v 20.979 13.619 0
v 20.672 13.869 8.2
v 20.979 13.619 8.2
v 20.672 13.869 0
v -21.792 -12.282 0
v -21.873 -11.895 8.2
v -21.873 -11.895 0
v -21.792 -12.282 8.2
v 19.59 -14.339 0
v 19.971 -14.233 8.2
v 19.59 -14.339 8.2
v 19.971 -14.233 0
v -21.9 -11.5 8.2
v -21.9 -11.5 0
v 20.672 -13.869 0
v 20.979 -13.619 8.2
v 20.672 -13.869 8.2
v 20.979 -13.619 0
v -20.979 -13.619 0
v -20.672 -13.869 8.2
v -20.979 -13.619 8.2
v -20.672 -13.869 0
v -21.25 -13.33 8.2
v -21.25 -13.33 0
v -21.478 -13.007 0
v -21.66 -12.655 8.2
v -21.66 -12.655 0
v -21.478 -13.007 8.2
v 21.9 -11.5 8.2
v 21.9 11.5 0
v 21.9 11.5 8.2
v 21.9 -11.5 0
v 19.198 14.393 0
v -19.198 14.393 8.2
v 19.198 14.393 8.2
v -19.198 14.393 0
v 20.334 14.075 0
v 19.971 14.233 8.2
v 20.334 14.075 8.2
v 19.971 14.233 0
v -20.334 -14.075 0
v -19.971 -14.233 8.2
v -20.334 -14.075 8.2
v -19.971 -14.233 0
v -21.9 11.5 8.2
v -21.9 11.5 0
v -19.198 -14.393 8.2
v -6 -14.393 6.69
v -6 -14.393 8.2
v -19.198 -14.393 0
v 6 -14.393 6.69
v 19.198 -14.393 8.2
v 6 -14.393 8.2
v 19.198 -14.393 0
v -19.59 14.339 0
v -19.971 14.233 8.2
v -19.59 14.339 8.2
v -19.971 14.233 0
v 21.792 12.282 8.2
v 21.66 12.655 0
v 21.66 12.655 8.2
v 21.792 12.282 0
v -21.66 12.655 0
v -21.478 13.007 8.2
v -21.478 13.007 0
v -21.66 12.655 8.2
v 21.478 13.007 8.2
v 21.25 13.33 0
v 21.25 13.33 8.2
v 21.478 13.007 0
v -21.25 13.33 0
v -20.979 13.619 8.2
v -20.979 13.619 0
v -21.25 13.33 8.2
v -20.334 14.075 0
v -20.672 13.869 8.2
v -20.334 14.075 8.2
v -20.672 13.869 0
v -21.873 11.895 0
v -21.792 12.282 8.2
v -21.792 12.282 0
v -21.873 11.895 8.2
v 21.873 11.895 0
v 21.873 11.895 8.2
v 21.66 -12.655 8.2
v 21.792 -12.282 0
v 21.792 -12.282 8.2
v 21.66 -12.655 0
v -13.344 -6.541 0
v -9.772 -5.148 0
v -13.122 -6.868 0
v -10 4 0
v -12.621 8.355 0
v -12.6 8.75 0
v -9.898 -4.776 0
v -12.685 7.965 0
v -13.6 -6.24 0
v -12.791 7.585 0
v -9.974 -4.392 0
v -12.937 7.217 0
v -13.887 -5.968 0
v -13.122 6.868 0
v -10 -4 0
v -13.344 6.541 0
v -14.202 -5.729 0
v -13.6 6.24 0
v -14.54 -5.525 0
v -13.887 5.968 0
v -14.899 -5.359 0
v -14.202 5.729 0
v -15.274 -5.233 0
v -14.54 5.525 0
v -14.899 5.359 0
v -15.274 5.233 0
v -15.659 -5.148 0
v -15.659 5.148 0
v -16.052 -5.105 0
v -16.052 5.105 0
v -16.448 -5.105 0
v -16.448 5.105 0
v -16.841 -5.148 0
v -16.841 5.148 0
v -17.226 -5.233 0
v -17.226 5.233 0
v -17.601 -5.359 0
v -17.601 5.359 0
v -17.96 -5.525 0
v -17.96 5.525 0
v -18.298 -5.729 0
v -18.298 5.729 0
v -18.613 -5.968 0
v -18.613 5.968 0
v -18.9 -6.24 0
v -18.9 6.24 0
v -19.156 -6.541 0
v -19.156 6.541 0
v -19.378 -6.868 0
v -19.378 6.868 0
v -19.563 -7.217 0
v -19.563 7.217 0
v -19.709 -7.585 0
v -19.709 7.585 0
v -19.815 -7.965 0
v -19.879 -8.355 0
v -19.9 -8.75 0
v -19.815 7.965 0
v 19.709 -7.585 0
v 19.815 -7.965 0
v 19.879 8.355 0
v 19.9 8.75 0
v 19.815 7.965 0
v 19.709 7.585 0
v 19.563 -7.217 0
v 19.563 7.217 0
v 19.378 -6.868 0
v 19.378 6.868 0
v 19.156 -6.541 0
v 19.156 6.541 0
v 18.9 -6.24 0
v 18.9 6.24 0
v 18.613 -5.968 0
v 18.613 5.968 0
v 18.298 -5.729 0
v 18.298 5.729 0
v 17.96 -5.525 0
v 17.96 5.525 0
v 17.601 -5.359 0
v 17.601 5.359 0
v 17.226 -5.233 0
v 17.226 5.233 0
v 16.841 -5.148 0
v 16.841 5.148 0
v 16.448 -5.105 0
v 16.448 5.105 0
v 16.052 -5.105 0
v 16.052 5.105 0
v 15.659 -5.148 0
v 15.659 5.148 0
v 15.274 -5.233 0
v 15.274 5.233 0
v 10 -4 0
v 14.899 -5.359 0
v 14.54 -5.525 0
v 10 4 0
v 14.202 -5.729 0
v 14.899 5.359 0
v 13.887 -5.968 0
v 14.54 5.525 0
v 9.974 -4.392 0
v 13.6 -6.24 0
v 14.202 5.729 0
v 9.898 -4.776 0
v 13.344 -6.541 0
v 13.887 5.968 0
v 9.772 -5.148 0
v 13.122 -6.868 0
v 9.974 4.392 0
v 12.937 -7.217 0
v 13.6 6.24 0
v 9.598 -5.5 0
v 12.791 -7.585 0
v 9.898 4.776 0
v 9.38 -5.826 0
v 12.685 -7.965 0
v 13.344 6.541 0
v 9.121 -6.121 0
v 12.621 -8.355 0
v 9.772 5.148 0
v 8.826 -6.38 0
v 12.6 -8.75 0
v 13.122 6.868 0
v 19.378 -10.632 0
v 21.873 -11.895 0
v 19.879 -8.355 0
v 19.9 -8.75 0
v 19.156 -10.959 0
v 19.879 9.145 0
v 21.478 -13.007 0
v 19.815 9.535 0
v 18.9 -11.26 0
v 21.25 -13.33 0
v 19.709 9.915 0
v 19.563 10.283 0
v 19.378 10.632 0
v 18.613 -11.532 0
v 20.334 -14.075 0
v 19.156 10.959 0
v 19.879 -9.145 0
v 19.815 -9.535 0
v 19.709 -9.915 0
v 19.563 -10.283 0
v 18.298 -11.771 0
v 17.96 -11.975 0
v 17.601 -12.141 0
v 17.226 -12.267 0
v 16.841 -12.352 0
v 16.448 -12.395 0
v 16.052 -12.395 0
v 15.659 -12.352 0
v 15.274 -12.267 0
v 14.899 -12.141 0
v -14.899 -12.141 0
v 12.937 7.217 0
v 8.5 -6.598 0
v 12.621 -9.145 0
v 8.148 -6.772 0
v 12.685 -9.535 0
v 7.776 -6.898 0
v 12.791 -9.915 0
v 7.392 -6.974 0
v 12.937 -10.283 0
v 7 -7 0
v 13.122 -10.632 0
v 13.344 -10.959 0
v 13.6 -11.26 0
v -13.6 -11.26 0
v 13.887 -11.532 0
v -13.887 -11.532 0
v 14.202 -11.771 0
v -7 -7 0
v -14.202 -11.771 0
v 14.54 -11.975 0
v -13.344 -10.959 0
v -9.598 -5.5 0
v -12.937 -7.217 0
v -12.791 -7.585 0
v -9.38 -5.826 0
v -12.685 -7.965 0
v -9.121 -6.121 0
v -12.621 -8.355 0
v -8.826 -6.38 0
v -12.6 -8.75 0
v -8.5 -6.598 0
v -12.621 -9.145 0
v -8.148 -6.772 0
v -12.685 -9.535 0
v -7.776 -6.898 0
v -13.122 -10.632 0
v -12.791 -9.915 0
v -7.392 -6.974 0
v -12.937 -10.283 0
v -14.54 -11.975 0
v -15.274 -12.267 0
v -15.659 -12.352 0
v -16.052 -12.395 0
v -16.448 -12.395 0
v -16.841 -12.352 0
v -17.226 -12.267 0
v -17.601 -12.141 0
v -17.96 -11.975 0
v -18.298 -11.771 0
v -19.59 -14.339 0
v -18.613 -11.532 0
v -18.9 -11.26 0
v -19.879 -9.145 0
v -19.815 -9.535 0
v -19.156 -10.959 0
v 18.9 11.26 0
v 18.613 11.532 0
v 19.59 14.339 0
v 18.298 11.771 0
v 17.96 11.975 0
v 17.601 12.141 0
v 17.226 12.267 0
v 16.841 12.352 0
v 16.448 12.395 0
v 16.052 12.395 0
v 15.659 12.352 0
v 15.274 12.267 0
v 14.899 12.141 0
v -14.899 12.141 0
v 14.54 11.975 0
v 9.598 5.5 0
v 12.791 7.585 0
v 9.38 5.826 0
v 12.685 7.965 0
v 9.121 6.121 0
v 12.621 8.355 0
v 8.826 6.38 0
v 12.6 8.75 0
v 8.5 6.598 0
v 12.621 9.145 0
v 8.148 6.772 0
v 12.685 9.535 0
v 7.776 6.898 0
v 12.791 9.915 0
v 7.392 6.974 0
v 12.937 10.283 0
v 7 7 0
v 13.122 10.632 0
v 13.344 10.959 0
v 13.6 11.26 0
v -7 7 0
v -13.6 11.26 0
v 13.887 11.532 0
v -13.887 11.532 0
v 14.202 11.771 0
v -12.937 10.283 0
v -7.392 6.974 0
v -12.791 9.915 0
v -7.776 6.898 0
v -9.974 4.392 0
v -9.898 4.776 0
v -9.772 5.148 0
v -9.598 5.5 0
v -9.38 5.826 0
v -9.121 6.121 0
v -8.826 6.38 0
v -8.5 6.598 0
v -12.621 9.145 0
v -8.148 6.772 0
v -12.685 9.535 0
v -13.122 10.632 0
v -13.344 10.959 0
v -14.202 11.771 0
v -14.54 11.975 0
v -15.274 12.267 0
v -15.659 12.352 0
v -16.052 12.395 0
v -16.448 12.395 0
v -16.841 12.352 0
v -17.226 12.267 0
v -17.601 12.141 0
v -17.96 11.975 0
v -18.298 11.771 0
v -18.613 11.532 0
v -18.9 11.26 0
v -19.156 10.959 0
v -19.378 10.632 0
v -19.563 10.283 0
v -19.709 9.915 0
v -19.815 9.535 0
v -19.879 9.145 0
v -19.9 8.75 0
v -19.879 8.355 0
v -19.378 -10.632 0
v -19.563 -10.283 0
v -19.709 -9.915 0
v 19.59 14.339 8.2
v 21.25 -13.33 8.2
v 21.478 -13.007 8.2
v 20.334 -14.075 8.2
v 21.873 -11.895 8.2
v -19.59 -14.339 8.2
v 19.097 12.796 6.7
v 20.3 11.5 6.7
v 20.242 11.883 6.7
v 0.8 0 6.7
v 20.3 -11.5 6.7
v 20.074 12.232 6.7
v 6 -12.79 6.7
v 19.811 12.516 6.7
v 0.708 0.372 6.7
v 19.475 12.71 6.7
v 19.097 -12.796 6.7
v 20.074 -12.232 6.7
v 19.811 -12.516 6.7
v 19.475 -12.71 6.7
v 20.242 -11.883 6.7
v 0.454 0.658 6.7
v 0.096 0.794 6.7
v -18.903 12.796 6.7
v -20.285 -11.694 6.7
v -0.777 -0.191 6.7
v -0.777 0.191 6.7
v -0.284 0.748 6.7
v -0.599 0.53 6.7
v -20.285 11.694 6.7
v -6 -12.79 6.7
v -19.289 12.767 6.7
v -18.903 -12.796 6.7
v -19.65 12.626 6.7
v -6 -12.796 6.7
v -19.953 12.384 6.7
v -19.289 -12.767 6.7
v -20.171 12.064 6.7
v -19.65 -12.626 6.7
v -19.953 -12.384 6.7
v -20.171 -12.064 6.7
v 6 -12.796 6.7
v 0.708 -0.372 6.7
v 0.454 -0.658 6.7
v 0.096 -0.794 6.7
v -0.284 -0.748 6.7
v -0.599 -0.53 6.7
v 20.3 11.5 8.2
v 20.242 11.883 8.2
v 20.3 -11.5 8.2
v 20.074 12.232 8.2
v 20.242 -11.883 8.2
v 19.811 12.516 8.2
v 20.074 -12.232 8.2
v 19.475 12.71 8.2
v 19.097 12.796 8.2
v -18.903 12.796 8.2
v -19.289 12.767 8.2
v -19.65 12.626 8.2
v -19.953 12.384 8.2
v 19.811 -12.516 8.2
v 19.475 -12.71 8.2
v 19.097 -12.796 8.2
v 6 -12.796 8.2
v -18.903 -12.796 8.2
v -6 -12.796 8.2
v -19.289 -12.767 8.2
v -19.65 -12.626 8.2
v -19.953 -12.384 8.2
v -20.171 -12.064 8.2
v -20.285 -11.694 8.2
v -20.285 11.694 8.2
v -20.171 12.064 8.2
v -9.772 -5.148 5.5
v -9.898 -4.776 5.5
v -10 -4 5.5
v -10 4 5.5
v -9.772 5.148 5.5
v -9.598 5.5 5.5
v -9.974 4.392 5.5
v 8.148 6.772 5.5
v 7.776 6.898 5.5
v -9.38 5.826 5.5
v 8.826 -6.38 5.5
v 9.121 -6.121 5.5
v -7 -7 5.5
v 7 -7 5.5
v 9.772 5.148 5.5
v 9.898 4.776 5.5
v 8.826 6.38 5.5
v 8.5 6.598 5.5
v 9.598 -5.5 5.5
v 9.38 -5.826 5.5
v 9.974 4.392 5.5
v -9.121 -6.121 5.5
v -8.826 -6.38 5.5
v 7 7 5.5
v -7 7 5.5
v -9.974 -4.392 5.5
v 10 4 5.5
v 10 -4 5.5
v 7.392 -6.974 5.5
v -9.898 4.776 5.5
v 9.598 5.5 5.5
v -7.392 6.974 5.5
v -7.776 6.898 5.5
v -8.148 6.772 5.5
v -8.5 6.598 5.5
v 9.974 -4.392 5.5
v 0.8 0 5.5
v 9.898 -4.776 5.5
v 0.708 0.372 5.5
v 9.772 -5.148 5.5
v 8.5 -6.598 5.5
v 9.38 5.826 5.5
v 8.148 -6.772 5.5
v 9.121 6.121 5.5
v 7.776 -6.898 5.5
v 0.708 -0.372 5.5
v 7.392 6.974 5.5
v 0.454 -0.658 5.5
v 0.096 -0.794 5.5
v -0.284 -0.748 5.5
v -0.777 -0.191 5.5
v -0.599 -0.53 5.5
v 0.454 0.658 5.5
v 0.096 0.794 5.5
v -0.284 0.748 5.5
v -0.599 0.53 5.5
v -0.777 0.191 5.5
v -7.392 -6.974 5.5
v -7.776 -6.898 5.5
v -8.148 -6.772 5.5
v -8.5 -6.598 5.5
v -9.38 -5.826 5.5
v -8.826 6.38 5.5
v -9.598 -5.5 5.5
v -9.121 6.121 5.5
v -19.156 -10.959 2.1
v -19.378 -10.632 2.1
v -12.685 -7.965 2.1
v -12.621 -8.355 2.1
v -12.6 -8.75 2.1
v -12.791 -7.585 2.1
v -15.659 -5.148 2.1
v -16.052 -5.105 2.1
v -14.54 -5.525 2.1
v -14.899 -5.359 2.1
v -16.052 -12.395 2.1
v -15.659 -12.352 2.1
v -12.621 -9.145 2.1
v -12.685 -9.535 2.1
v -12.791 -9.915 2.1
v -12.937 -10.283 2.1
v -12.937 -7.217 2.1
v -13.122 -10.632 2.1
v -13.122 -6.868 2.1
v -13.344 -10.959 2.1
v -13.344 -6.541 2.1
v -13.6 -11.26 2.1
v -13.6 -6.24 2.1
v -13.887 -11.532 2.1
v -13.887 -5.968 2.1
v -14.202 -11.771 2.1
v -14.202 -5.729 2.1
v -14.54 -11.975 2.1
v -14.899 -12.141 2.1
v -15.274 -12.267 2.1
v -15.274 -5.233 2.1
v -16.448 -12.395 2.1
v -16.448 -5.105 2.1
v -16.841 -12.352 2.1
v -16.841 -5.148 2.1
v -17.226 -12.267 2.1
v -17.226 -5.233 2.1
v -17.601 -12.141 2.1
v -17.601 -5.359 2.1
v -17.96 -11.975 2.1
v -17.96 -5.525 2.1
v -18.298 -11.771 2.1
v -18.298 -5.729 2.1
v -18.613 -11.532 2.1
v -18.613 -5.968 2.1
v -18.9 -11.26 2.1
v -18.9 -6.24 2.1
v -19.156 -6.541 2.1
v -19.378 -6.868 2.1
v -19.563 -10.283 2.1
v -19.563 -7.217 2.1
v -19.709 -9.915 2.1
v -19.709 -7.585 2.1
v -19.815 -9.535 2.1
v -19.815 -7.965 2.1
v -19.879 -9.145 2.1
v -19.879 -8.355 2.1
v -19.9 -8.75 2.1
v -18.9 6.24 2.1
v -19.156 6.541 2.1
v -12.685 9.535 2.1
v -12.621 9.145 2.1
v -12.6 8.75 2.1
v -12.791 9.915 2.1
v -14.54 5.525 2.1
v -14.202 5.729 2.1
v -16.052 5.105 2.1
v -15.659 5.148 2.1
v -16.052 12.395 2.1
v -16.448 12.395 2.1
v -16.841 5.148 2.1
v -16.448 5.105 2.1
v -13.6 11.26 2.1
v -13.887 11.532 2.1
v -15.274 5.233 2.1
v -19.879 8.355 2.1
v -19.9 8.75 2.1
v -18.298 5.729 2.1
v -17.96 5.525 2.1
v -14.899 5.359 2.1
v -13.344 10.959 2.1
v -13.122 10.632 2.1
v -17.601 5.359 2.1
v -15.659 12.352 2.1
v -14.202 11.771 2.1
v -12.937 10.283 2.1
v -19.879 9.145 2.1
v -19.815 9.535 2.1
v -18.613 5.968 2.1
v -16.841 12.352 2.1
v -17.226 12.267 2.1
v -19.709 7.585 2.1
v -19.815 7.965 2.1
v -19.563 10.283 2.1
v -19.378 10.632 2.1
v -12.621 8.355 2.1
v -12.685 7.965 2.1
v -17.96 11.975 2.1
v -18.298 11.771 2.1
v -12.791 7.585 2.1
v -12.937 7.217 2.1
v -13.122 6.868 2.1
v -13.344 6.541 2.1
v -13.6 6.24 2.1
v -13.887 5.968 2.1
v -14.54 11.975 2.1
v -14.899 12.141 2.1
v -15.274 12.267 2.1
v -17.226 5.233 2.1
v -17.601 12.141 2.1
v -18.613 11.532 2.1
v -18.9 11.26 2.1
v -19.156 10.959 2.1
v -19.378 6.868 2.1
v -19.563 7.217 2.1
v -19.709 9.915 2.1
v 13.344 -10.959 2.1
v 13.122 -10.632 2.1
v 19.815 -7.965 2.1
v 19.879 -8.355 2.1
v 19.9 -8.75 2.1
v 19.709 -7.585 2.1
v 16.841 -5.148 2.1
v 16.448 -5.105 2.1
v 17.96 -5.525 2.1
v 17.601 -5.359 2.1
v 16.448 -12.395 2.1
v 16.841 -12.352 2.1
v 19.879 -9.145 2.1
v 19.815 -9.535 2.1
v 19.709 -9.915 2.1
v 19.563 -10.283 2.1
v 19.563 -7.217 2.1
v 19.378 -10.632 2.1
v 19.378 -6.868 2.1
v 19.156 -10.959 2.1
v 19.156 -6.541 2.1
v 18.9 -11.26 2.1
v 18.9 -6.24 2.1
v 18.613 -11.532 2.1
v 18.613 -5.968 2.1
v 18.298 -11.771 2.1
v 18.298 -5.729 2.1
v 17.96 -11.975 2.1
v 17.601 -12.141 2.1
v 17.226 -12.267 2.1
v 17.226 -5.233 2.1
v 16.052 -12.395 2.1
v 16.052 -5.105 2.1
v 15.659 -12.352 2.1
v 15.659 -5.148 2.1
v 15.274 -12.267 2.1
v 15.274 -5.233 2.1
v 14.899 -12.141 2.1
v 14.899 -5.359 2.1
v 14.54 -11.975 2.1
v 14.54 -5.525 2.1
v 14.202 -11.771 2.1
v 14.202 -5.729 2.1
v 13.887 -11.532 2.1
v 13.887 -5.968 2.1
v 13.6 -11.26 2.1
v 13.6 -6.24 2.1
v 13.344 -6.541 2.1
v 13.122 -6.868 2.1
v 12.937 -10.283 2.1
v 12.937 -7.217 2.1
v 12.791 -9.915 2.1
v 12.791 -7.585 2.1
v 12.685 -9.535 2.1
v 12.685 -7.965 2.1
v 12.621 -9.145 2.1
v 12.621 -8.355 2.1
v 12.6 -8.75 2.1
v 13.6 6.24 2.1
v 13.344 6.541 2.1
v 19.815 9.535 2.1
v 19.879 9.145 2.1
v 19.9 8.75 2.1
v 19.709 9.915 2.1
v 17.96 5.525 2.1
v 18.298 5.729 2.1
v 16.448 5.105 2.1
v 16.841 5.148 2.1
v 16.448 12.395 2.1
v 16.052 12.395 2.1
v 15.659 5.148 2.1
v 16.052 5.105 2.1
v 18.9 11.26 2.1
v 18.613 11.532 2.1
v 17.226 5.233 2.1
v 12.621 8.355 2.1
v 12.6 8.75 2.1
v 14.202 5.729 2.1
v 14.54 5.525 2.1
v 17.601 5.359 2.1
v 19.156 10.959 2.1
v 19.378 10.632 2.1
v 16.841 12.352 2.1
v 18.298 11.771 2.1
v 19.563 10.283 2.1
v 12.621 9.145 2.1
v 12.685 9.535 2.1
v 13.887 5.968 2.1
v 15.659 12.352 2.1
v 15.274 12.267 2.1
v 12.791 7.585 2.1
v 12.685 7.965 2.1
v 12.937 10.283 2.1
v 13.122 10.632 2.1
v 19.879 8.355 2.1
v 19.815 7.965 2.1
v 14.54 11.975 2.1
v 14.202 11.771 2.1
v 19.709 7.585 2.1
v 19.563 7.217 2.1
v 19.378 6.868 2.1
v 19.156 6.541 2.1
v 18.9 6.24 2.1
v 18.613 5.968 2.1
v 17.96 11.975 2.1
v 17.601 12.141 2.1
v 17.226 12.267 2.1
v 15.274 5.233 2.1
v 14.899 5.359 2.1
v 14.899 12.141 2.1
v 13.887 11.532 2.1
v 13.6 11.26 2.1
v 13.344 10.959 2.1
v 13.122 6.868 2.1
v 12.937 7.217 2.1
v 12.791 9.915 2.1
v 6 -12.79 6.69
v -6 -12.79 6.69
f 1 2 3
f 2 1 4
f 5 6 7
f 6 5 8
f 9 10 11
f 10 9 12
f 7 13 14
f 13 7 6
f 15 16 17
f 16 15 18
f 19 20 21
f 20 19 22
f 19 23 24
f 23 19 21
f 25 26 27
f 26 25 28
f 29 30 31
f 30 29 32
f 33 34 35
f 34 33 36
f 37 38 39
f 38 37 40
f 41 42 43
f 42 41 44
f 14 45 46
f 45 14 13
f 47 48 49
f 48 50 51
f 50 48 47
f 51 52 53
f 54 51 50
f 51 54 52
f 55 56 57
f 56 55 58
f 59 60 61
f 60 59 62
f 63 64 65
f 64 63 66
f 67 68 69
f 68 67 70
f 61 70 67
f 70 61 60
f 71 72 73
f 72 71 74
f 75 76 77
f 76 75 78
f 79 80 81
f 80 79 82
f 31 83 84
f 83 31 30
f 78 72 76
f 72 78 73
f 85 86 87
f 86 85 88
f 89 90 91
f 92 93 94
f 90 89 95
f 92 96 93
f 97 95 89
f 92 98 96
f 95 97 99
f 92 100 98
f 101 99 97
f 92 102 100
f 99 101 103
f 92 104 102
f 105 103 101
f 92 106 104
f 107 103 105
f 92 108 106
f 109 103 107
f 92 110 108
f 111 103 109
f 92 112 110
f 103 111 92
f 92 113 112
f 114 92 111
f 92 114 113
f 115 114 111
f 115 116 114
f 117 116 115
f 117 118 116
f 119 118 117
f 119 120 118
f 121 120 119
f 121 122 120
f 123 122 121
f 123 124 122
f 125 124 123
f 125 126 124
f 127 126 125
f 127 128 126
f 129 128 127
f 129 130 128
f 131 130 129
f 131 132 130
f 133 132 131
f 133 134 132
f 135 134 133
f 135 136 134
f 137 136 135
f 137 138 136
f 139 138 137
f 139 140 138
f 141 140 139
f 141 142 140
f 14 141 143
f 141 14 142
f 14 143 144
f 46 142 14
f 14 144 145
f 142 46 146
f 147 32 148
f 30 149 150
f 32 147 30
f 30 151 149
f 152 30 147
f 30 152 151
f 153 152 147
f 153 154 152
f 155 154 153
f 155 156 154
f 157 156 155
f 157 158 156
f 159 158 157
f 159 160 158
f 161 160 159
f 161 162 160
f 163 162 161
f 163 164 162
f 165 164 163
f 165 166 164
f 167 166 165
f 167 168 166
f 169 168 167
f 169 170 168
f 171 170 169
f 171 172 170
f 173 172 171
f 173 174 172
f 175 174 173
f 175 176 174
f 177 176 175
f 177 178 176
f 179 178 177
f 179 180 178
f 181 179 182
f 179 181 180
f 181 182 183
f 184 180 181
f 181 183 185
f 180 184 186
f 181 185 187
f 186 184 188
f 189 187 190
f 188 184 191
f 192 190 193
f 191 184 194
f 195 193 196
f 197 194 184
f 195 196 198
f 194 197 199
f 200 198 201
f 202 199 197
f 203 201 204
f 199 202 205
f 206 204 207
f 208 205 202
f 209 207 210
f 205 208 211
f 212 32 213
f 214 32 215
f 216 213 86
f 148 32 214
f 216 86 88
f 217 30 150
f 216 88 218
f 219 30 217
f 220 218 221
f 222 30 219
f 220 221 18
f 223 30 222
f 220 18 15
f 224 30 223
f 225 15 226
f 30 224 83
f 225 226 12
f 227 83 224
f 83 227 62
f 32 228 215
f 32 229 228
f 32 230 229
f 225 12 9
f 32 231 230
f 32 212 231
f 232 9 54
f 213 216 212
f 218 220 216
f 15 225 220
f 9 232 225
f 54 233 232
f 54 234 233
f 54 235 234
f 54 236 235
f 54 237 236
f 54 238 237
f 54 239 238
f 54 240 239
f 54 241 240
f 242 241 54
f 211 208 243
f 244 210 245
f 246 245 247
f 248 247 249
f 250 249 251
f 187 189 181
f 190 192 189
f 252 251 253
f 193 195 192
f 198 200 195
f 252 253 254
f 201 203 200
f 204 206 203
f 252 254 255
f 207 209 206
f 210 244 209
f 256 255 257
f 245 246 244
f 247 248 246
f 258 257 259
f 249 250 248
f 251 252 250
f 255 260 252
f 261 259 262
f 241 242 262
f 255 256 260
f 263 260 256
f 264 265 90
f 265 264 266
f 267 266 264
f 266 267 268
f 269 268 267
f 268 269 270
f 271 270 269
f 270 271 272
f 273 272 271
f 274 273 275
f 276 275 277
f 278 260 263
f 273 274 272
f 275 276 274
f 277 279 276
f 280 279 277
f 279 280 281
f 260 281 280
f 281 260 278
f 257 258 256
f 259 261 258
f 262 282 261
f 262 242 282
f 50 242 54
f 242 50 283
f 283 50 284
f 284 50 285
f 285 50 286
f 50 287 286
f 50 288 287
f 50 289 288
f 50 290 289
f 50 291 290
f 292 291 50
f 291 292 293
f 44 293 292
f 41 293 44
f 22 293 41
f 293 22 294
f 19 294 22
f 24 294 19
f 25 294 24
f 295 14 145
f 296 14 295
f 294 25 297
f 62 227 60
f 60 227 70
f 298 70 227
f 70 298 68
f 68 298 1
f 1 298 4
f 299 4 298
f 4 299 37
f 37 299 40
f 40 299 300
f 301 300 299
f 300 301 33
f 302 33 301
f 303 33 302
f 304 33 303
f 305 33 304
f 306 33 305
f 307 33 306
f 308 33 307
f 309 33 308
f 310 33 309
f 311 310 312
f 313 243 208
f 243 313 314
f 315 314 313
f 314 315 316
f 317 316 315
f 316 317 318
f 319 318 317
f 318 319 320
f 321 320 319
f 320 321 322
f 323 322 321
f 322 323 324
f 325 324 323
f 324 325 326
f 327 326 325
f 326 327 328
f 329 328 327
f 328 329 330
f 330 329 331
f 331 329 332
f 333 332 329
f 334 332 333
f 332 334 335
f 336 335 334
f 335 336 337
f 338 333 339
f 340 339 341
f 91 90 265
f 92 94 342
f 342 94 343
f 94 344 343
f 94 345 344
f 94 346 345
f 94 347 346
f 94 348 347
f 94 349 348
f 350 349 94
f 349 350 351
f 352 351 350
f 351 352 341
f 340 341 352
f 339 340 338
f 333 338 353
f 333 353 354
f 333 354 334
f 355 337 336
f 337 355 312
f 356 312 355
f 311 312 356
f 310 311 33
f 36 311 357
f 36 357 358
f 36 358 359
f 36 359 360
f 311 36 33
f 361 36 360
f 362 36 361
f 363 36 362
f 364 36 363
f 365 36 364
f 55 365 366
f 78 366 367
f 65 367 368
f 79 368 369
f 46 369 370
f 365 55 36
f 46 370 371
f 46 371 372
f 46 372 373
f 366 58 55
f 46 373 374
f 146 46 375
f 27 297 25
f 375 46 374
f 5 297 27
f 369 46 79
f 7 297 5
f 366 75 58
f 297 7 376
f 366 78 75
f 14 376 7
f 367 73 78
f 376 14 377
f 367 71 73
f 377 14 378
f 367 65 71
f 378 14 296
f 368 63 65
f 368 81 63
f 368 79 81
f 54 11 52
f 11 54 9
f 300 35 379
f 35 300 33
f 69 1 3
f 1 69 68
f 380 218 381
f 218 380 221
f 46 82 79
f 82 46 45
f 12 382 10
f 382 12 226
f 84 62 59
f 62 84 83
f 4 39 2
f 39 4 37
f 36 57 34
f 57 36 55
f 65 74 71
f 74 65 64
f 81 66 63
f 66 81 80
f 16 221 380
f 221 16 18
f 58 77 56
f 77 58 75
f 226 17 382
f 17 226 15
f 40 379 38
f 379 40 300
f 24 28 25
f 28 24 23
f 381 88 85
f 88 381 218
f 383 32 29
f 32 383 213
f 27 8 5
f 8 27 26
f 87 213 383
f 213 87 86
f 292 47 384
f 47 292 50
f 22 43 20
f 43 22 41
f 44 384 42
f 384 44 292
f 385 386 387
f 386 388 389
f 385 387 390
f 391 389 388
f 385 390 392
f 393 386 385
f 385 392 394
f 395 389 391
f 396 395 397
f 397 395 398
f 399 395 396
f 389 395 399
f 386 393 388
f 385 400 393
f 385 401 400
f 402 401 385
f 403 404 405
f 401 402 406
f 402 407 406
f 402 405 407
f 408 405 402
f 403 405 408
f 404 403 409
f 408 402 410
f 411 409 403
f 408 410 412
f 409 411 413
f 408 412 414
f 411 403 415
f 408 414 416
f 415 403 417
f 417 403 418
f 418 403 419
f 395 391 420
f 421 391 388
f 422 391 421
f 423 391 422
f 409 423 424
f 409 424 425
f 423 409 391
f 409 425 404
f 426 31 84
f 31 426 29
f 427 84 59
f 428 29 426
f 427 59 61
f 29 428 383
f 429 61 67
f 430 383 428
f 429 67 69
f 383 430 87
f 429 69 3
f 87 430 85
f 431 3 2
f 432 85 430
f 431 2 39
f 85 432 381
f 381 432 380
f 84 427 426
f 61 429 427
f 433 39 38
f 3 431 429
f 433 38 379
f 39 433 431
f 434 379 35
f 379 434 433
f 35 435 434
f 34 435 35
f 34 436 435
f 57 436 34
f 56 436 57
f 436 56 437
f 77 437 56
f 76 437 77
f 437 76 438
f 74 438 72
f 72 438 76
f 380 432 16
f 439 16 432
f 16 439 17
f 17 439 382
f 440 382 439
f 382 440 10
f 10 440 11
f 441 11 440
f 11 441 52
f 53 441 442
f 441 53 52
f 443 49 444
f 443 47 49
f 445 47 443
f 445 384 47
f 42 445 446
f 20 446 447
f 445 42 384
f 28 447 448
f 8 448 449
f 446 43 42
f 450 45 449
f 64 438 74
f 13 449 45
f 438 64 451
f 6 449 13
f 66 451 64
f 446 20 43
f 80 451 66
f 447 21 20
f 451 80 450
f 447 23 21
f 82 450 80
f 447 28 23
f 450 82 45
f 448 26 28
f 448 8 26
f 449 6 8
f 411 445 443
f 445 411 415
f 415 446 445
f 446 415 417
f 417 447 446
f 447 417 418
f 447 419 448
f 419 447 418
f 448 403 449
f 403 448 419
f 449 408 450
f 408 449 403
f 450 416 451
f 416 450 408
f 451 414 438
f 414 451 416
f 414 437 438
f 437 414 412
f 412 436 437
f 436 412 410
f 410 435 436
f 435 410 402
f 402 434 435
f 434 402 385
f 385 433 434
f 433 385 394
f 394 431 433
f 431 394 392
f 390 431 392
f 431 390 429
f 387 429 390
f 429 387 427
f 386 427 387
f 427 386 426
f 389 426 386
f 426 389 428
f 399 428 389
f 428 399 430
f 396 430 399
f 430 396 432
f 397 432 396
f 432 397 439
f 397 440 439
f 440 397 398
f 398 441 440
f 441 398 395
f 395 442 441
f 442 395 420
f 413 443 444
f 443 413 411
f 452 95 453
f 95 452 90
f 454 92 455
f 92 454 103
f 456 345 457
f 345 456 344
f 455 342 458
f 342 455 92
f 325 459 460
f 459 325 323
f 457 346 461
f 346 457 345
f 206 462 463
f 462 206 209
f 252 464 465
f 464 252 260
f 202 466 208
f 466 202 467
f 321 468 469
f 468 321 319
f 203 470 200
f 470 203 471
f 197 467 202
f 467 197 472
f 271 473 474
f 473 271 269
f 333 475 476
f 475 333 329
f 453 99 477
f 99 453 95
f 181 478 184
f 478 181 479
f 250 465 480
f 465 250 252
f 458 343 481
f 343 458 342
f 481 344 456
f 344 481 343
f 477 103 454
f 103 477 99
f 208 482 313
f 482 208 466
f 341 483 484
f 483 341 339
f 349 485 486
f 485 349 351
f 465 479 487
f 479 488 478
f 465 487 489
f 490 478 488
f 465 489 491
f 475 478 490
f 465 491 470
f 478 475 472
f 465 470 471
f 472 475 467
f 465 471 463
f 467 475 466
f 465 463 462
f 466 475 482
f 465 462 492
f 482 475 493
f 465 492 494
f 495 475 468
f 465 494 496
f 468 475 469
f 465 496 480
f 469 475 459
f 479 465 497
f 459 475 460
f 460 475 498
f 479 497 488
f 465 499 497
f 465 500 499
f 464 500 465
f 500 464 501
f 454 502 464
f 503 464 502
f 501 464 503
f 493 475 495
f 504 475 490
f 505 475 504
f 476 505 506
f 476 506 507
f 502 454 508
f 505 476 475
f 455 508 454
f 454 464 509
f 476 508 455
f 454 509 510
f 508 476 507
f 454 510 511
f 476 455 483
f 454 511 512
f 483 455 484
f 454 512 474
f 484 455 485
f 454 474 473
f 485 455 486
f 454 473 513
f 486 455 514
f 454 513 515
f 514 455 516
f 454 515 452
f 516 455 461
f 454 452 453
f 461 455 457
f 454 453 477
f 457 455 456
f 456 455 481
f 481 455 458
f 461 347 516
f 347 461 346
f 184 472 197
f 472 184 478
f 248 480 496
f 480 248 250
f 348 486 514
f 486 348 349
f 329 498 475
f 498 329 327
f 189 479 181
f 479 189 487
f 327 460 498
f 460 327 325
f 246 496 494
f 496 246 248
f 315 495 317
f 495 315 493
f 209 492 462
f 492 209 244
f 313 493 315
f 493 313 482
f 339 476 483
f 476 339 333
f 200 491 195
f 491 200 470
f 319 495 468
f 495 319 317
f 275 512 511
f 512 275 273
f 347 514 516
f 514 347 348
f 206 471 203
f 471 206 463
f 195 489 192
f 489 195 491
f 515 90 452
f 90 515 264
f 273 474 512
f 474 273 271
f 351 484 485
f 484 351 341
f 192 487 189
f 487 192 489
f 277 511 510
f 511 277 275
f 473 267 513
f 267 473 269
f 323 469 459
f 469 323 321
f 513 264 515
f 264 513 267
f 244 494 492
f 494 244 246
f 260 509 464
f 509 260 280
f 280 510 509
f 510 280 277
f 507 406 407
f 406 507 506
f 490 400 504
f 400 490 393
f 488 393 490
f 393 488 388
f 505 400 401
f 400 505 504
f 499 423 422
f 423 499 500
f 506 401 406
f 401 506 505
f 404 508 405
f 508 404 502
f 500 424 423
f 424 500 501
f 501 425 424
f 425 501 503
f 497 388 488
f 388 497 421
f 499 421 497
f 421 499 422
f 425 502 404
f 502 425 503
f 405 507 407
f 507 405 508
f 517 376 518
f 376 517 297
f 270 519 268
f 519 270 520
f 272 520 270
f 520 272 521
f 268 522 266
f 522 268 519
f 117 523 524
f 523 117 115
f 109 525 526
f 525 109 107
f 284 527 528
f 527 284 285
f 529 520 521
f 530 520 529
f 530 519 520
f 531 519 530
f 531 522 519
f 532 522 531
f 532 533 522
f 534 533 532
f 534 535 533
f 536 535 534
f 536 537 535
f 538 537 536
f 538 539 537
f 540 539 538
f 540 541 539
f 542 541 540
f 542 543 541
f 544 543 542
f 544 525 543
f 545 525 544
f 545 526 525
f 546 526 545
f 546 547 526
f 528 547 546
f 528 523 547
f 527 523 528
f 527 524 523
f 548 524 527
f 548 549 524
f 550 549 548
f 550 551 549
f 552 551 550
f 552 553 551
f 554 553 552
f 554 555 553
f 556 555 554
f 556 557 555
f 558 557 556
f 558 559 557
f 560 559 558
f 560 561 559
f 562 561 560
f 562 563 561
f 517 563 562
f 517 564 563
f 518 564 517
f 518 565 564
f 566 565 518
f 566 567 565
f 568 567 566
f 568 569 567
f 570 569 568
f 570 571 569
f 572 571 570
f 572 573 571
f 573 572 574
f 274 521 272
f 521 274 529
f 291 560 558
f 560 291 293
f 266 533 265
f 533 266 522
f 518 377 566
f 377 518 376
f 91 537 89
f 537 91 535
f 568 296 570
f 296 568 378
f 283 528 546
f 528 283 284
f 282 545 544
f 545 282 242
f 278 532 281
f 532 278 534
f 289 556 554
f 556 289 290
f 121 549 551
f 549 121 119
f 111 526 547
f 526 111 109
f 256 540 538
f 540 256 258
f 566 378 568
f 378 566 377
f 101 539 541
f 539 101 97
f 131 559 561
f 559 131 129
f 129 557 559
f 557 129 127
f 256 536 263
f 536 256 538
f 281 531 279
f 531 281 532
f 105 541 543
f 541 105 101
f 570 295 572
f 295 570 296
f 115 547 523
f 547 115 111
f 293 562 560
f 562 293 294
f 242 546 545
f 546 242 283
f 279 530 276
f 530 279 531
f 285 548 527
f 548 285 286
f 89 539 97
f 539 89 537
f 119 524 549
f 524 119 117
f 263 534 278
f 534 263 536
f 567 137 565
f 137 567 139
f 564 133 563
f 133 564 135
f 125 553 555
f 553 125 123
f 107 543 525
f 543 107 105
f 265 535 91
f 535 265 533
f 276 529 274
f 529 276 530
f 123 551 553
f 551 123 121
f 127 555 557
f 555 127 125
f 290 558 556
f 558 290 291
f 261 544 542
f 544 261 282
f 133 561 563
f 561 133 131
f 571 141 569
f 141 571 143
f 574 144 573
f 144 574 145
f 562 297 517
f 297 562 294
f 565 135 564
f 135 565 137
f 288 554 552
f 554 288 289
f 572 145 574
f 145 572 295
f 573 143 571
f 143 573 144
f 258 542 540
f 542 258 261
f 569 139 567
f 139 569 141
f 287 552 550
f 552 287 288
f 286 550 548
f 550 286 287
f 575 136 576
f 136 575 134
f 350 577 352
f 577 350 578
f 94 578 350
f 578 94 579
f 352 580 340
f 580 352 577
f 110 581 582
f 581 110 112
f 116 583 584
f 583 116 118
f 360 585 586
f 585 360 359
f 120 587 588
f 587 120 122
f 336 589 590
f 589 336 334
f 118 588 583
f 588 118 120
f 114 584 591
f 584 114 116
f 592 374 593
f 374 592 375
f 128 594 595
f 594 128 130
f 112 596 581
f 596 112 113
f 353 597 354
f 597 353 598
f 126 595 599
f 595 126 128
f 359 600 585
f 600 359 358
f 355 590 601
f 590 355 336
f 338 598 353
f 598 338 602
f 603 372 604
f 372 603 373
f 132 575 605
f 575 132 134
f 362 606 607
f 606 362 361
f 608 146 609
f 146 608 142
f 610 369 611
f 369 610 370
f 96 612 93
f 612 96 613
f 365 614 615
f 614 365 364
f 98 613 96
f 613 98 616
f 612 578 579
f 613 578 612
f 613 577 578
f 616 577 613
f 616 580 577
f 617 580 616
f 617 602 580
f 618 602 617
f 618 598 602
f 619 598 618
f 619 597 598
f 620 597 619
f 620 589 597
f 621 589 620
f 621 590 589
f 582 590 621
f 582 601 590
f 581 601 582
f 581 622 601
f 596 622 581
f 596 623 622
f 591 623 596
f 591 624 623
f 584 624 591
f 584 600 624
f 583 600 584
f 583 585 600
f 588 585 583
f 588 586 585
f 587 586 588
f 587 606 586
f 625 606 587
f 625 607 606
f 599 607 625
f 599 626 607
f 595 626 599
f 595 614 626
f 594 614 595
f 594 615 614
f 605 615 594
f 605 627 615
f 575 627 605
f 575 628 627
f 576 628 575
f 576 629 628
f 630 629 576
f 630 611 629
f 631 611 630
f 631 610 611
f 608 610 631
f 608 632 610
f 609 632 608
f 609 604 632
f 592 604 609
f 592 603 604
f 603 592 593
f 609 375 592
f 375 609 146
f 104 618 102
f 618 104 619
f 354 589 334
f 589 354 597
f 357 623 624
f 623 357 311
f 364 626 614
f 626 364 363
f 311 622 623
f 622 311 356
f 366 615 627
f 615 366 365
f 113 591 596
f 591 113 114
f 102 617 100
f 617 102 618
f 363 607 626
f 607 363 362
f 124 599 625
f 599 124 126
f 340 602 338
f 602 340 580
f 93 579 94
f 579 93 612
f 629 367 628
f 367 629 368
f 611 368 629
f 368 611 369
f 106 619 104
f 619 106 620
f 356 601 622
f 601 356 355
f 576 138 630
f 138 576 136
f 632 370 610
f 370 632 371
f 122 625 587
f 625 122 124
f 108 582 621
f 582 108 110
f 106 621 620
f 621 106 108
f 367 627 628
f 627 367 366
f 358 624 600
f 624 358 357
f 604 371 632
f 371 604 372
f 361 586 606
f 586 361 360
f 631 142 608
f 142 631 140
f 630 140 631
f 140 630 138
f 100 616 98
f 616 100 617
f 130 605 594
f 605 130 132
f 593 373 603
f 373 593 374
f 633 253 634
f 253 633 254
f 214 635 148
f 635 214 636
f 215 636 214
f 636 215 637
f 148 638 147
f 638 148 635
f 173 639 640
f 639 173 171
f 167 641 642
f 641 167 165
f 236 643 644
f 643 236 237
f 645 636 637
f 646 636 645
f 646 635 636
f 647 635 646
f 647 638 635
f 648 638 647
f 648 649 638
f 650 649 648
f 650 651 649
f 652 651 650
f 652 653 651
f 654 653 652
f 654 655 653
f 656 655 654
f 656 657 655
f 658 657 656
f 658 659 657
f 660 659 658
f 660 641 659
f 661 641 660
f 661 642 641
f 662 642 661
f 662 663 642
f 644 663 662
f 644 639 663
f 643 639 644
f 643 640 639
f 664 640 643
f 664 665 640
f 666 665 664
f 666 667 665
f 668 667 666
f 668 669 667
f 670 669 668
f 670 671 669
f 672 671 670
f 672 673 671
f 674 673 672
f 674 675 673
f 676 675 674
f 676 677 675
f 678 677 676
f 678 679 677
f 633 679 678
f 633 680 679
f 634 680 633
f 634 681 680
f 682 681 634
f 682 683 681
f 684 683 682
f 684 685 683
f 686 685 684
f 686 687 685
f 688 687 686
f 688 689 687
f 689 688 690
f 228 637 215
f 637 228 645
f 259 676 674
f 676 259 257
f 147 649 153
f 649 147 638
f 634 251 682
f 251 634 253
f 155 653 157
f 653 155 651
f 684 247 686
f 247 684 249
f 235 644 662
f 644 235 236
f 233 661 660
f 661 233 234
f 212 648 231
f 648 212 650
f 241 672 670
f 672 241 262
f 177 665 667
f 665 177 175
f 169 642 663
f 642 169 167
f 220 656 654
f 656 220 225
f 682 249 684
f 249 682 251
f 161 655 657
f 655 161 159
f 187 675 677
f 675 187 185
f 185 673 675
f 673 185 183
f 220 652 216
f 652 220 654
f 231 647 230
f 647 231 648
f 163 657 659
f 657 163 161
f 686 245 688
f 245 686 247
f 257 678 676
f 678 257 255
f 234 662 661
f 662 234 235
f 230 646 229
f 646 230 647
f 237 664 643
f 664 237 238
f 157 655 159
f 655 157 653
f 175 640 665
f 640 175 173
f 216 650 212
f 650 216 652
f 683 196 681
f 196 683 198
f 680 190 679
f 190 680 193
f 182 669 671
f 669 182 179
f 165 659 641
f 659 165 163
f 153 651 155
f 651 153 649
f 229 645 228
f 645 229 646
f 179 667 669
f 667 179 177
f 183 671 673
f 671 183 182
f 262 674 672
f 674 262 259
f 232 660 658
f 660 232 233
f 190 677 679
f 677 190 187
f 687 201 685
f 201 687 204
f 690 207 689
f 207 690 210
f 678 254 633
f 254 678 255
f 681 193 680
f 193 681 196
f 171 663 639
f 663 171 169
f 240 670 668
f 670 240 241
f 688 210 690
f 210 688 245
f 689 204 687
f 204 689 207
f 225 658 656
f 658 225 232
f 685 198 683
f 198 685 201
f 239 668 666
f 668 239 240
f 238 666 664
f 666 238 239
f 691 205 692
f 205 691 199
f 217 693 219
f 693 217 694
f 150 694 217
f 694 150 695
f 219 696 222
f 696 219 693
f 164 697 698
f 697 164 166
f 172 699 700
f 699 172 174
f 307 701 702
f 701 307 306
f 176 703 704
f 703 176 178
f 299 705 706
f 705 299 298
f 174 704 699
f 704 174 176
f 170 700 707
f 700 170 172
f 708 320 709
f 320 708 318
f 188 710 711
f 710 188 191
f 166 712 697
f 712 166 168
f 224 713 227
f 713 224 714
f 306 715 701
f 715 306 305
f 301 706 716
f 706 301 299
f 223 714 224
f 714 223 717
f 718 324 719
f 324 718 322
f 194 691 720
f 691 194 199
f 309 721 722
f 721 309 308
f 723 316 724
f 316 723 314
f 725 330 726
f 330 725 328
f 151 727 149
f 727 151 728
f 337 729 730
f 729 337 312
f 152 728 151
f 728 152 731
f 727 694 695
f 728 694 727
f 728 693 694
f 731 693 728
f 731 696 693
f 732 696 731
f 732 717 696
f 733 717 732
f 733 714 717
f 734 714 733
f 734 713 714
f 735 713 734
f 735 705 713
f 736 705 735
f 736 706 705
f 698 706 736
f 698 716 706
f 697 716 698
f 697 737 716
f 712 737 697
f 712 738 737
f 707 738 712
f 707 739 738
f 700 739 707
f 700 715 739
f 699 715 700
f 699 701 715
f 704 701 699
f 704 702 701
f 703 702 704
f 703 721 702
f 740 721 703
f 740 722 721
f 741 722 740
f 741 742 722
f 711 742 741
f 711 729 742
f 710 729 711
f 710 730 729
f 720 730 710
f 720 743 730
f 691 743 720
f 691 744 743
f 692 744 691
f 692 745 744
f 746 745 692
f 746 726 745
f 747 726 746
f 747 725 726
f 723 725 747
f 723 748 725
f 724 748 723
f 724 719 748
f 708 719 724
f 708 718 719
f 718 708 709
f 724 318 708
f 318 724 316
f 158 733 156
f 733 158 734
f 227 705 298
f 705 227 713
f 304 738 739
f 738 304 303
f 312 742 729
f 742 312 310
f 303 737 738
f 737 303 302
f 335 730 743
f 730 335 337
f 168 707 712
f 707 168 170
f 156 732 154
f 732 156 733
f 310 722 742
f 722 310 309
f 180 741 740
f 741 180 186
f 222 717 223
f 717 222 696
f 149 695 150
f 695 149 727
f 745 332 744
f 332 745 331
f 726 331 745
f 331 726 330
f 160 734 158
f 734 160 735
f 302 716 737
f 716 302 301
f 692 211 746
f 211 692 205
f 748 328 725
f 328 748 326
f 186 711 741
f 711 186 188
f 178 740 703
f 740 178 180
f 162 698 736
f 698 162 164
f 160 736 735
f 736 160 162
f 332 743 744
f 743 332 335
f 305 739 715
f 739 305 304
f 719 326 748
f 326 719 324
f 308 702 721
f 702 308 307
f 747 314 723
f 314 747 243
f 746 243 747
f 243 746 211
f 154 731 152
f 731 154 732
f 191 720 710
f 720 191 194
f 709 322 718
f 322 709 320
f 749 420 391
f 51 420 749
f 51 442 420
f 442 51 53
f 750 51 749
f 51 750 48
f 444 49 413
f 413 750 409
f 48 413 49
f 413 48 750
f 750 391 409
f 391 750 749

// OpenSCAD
// Magnetsockel für rechteckigen Ansteck-Pin (Standard: 40 x 25 mm)
// Macht aus einem Ansteck-Pin einen Kühlschrankmagneten, OHNE den Pin zu
// verändern: der Pin behält Nadel und Schmetterlings-Clutch.
// Alle Maße in Millimetern (Regel: units-mm)
//
// Kontext (Regel: context-first), Stand bei Erstellung:
//   - context/printer.md:    Anycubic Kobra S1, 0.4mm Düse, PEI, 250mm Bauraum
//   - context/tolerances.md: Presspassung 0.05–0.15mm/Seite, bewegliche
//                            Passung 0.2–0.25mm/Seite, eff. XY-Fehler
//                            ~0.15–0.2mm/Seite
//   - context/materials.md:  noch leer -> PLA
//
// Anforderungen aus dem Design-Dialog:
//   - Pin rechteckig 40 x 25 mm, ein Nadelstift mit Schmetterlings-Clutch
//   - Halt am Sockel: Nadel durch eine dünne Platte stecken, Clutch dahinter
//     aufsetzen – genau wie auf Stoff. Fest, aber jederzeit abnehmbar,
//     kein Kleber, keine Änderung am Pin.
//   - Sockel haftet mit Magneten auf einer Metallfläche (Kühlschrank)
//   - Magnete: 7 x 2 mm rund (vorhanden), werden eingeklebt
//
// Funktionsprinzip / Aufbau (Z = 0 liegt am Kühlschrank):
//   z 0 .. pocket_d    Clutch-Mulde: nach hinten offene Wanne, in der der
//                      Schmetterling sitzt. Offen, damit man ihn mit den
//                      Fingern oder einer Pinzette aufdrücken kann.
//   z 0 .. 2.1         Magnettaschen, nach hinten offen -> Magnet liegt
//                      direkt (0.1mm zurückgesetzt) an der Metallfläche an,
//                      das ist die maximale Haltekraft.
//   pocket_d .. base_t Klemmplatte (plate_t) mit dem Nadelloch – das ist der
//                      "Stoff", auf den die Clutch klemmt.
//   base_t .. +rim_h   Umlaufender Rand, in dem der Pin liegt. Verhindert,
//                      dass sich der Pin um die einzelne Nadel verdreht.
//                      An der Unterkante eine Griffkerbe zum Herausheben.
//
// Montage:
//   1. Magnete einkleben (alle mit derselben Polung nach außen, sonst
//      schwächen sie sich gegenseitig). Sie dürfen nicht überstehen –
//      die Tasche ist 0.1mm tiefer als der Magnet.
//   2. Clutch vom Pin abziehen, Nadel von vorne durch das Nadelloch stecken,
//      Pin flach in den Rand legen.
//   3. Von hinten die Clutch in der Mulde wieder auf die Nadel drücken.
//
// Druckausrichtung: Rückseite (Magnetseite) auf dem Druckbett, Pin-Auflage
//   nach oben. Keine Stützen nötig. Gebrückt werden nur die Magnettaschen
//   (Ø7.3mm) und die Decke der Clutch-Mulde (Spannweite = pocket_h, ~14mm) –
//   beides unkritisch (printer.md nennt Durchhang erst bei 50mm+).
//   Die plane Rückseite liegt auf dem PEI = gute Haftung und exakt die
//   Fläche, die später am Kühlschrank anliegt.
//
// ZUERST MESSEN (Messschieber) und unten eintragen, dann part="test"
// drucken (~2 Minuten) und die Clutch-Klemmung prüfen:
//   - needle_d   Nadeldurchmesser
//   - needle_len freie Nadellänge ab Pin-Rückseite
//   - clutch_d   Breite der Clutch mit ausgeklappten Flügeln
//   - clutch_h   Bauhöhe der Clutch, auf der Nadel sitzend
//   - pin_w/pin_h/pin_corner_r  Außenmaße und Eckenradius des Pins
//   - needle_off_x/y  Versatz der Nadel aus der Pin-Mitte (oft nicht mittig!)

/* [Pin] */
// Breite des Pins (X)
pin_w = 40;
// Höhe des Pins (Y)
pin_h = 25;
// Eckenradius des Pins. Im Zweifel klein lassen - eine zu runde Aussparung
// klemmt an den Ecken, eine zu eckige laesst nur eine Fuge sichtbar.
pin_corner_r = 1.0;
// Nadelversatz aus der Pin-Mitte in X
needle_off_x = 0;
// Nadelversatz aus der Pin-Mitte in Y
needle_off_y = 0;
// Nadeldurchmesser
needle_d = 1.2;
// Freie Nadellaenge ab Pin-Rueckseite
needle_len = 6.0;
// Breite der Clutch mit ausgeklappten Fluegeln
clutch_d = 12.0;
// Bauhoehe der Clutch auf der Nadel
clutch_h = 5.0;

/* [Magnete] */
// Magnetdurchmesser
magnet_d = 7.0;
// Magnetdicke
magnet_t = 2.0;
// Anzahl Magnete bei automatischer Platzierung
magnet_count = 4; // [2, 4]
// Magnetpositionen [x,y] relativ zur Sockelmitte. Leer = automatisch in die
// Ecken. Bei stark aussermittiger Nadel kollidieren die automatischen
// Positionen evtl. mit der Clutch-Mulde - dann hier von Hand setzen,
// Die Pruefung unten meldet jede Kollision mit Nummer und Abstand.
// Geprueftes Beispiel fuer needle_off_x=8, needle_off_y=4 (Pin 40x25):
//   magnet_pos = [[-16.25, 8.75], [-16.25, -8.75], [8, -9]]
magnet_pos = [];

/* [Sockel] */
// Hoehe des Randes um den Pin. Sinnvoll: etwa die Dicke des Pins, hoechstens
// so hoch wie der Pin dick ist - sonst steht der Rand vor dem Pin.
// 0 = kein Rand, dann haelt nur die Clutch (Pin kann sich dann verdrehen).
rim_h = 1.5;
// Wandstaerke des Randes
rim_t = 1.6;
// Luft zwischen Pin und Rand pro Seite
pin_fit = 0.3;
// Dicke der Klemmplatte (der "Stoff" fuer die Clutch)
plate_t = 1.2;
// Breite der Griffkerbe im Rand (0 = keine)
notch_w = 12;
// Zusaetzlicher Platz in der Clutch-Mulde zum Zugreifen (Finger/Pinzette).
// Bei kleineren Pins verkleinern, dann passen die Magnete wieder daneben.
clutch_access = 8;

/* [Ausgabe] */
// sockel = fertiges Teil, test = kleiner Pruefkoerper nur fuer Nadel+Clutch
part = "sockel"; // [sockel, test]

/* [Hidden] */
$fa = 2;
$fs = 0.4;
eps = 0.01;

// ---- abgeleitete Maße -------------------------------------------------
// Nadelloch etwas groesser als die Nadel: es soll nicht klemmen, das Halten
// uebernimmt die Clutch. Der Rand verhindert das Verdrehen.
needle_hole_d   = needle_d + 0.4;
// Magnettaschen: 0.3mm Uebermaß zum Einkleben (wie kartenbox_*: 6mm -> 6.3),
// 0.1mm tiefer als der Magnet, damit nichts uebersteht.
magnet_pocket_d = magnet_d + 0.3;
magnet_pocket_t = magnet_t + 0.1;
// Rand-Abstand der Magnettaschen zur Außenkante
magnet_wall     = 2.0;

// Clutch-Mulde: rundum Luft um die Clutch, zusaetzlich Zugriff fuer Finger
// bzw. Pinzette. Deshalb deutlich groesser als die Clutch selbst.
pocket_w = clutch_d + clutch_access;
pocket_h = max(clutch_d + 2, 12);
pocket_r = 3;
// Tiefe: die Clutch muss komplett versenkt sein UND die Nadelspitze darf
// nicht hinten herausstehen (sonst kratzt sie am Kuehlschrank).
pocket_d = max(clutch_h + 0.5, needle_len - plate_t + 0.5);

base_t = plate_t + pocket_d;
base_w = pin_w + 2 * (pin_fit + rim_t);
base_h = pin_h + 2 * (pin_fit + rim_t);
base_r = pin_corner_r + pin_fit + rim_t;

recess_w = pin_w + 2 * pin_fit;
recess_h = pin_h + 2 * pin_fit;
recess_r = pin_corner_r + pin_fit;

magnet_x_auto = base_w / 2 - magnet_pocket_d / 2 - magnet_wall;
magnet_y_auto = base_h / 2 - magnet_pocket_d / 2 - magnet_wall;
magnets = (len(magnet_pos) > 0) ? magnet_pos
        : (magnet_count == 4)
          ? [for (sx = [-1, 1], sy = [-1, 1])
                [sx * magnet_x_auto, sy * magnet_y_auto]]
          : [for (sx = [-1, 1]) [sx * magnet_x_auto, 0]];

// ---- Pruefungen -------------------------------------------------------
// Vorzeichenbehafteter Abstand eines Punktes zum Rand eines abgerundeten
// Rechtecks (negativ = innerhalb). Damit wird echt in 2D geprueft, ob eine
// Magnettasche die Clutch-Mulde anschneidet bzw. aus dem Sockel laeuft -
// eine reine X- oder Y-Betrachtung uebersieht die Diagonale.
function sdf_rrect(p, c, hw, hh, r) =
    let (dx = abs(p[0] - c[0]) - (hw - r),
         dy = abs(p[1] - c[1]) - (hh - r))
    sqrt(pow(max(dx, 0), 2) + pow(max(dy, 0), 2)) + min(max(dx, dy), 0) - r;

// Abstand Magnettasche <-> Clutch-Mulde (Material dazwischen)
gap_pocket = [for (m = magnets)
    sdf_rrect(m, [needle_off_x, needle_off_y], pocket_w / 2, pocket_h / 2,
              pocket_r) - magnet_pocket_d / 2];
// Abstand Magnettasche <-> Außenkante des Sockels
gap_edge = [for (m = magnets)
    -sdf_rrect(m, [0, 0], base_w / 2, base_h / 2, base_r)
    - magnet_pocket_d / 2];

for (i = [0 : len(magnets) - 1]) {
    assert(gap_pocket[i] >= 0.8,
           str("Magnet ", i, " bei ", magnets[i],
               " schneidet die Clutch-Mulde an (Abstand ", gap_pocket[i],
               "mm, noetig 0.8). Abhilfe: clutch_access kleiner, kleinere ",
               "Magnete, magnet_pos von Hand setzen oder magnet_count=2."));
    assert(gap_edge[i] >= 1.2,
           str("Magnet ", i, " bei ", magnets[i],
               " liegt zu nah an der Außenkante (Wand ", gap_edge[i],
               "mm, noetig 1.2)."));
}
// Mulde muss mit Restwand innerhalb des Sockels liegen
assert(-sdf_rrect([needle_off_x + pocket_w / 2, needle_off_y + pocket_h / 2],
                  [0, 0], base_w / 2, base_h / 2, base_r) >= 0
       && abs(needle_off_x) + pocket_w / 2 <= base_w / 2 - 2.0
       && abs(needle_off_y) + pocket_h / 2 <= base_h / 2 - 2.0,
       "Clutch-Mulde passt nicht in den Sockel (Pin zu klein oder Nadel zu weit aussen).");
// Material ueber dem Magneten
assert(base_t - magnet_pocket_t >= 1.2,
       "Zu wenig Material ueber den Magnettaschen.");
// Nadelspitze darf nicht hinten herausstehen
assert(pocket_d - (needle_len - plate_t) >= 0.4,
       "Nadel steht hinten heraus - pocket_d/needle_len pruefen.");
// Wandstaerken (Regel: printability-report) - 2x Duesendurchmesser = 0.8mm
assert(rim_t >= 0.8 && plate_t >= 0.8,
       "Wandstaerke unter 0.8mm (2x Duese 0.4mm).");

echo(str("--- pin_magnetsockel: Sockel ", base_w, " x ", base_h,
         " x ", base_t + rim_h, " mm ---"));
echo(str("Klemmplatte ", plate_t, "mm, Clutch-Mulde ", pocket_w, " x ",
         pocket_h, " x ", pocket_d, "mm tief"));
echo(str("Nadelspitze endet ", pocket_d - (needle_len - plate_t),
         "mm vor der Rueckseite"));
echo(str("Magnete: ", len(magnets), "x ", magnet_d, "x", magnet_t,
         " bei ", magnets));
echo(str("Wand Magnet->Mulde ", gap_pocket, "mm, Magnet->Außenkante ",
         gap_edge, "mm"));
echo(str("Bruecken: Magnettasche ", magnet_pocket_d, "mm, Muldendecke ",
         pocket_h, "mm - beide unkritisch"));

// ---- Hilfsmodule ------------------------------------------------------
module rrect(w, h, r) {
    hull() for (x = [-1, 1], y = [-1, 1])
        translate([x * (w / 2 - r), y * (h / 2 - r)]) circle(r = r);
}

// Clutch-Mulde + Nadelloch, als Werkzeug zum Abziehen
module clutch_cuts() {
    translate([needle_off_x, needle_off_y, -eps])
        linear_extrude(pocket_d + eps)
            rrect(pocket_w, pocket_h, pocket_r);
    translate([needle_off_x, needle_off_y, -eps])
        cylinder(d = needle_hole_d, h = base_t + 2 * eps);
}

// ---- Teile ------------------------------------------------------------
module sockel() {
    render(convexity = 8)
    difference() {
        union() {
            linear_extrude(base_t) rrect(base_w, base_h, base_r);
            if (rim_h > 0)
                translate([0, 0, base_t]) linear_extrude(rim_h)
                    difference() {
                        rrect(base_w, base_h, base_r);
                        rrect(recess_w, recess_h, recess_r);
                    }
        }
        clutch_cuts();
        // Magnettaschen, nach hinten offen
        for (m = magnets)
            translate([m[0], m[1], -eps])
                cylinder(d = magnet_pocket_d, h = magnet_pocket_t + eps);
        // Griffkerbe im Rand (Vorderkante, -Y), zum Herausheben des Pins
        if (notch_w > 0 && rim_h > 0)
            translate([-notch_w / 2, -base_h / 2 - 1, base_t - eps])
                cube([notch_w, base_h / 2 - recess_h / 2 + 1 + eps,
                      rim_h + 2 * eps]);
    }
}

// Pruefkoerper: nur Klemmplatte + Mulde + Nadelloch, gleiche Dicken wie am
// Sockel. Damit vor dem Volldruck testen, ob die Clutch sicher greift und
// ob die Nadel lang genug ist.
module test_chip() {
    render(convexity = 6)
    difference() {
        translate([needle_off_x, needle_off_y, 0])
            linear_extrude(base_t) rrect(pocket_w + 8, pocket_h + 6, 3);
        clutch_cuts();
    }
}

if (part == "sockel") sockel();
else if (part == "test") test_chip();
